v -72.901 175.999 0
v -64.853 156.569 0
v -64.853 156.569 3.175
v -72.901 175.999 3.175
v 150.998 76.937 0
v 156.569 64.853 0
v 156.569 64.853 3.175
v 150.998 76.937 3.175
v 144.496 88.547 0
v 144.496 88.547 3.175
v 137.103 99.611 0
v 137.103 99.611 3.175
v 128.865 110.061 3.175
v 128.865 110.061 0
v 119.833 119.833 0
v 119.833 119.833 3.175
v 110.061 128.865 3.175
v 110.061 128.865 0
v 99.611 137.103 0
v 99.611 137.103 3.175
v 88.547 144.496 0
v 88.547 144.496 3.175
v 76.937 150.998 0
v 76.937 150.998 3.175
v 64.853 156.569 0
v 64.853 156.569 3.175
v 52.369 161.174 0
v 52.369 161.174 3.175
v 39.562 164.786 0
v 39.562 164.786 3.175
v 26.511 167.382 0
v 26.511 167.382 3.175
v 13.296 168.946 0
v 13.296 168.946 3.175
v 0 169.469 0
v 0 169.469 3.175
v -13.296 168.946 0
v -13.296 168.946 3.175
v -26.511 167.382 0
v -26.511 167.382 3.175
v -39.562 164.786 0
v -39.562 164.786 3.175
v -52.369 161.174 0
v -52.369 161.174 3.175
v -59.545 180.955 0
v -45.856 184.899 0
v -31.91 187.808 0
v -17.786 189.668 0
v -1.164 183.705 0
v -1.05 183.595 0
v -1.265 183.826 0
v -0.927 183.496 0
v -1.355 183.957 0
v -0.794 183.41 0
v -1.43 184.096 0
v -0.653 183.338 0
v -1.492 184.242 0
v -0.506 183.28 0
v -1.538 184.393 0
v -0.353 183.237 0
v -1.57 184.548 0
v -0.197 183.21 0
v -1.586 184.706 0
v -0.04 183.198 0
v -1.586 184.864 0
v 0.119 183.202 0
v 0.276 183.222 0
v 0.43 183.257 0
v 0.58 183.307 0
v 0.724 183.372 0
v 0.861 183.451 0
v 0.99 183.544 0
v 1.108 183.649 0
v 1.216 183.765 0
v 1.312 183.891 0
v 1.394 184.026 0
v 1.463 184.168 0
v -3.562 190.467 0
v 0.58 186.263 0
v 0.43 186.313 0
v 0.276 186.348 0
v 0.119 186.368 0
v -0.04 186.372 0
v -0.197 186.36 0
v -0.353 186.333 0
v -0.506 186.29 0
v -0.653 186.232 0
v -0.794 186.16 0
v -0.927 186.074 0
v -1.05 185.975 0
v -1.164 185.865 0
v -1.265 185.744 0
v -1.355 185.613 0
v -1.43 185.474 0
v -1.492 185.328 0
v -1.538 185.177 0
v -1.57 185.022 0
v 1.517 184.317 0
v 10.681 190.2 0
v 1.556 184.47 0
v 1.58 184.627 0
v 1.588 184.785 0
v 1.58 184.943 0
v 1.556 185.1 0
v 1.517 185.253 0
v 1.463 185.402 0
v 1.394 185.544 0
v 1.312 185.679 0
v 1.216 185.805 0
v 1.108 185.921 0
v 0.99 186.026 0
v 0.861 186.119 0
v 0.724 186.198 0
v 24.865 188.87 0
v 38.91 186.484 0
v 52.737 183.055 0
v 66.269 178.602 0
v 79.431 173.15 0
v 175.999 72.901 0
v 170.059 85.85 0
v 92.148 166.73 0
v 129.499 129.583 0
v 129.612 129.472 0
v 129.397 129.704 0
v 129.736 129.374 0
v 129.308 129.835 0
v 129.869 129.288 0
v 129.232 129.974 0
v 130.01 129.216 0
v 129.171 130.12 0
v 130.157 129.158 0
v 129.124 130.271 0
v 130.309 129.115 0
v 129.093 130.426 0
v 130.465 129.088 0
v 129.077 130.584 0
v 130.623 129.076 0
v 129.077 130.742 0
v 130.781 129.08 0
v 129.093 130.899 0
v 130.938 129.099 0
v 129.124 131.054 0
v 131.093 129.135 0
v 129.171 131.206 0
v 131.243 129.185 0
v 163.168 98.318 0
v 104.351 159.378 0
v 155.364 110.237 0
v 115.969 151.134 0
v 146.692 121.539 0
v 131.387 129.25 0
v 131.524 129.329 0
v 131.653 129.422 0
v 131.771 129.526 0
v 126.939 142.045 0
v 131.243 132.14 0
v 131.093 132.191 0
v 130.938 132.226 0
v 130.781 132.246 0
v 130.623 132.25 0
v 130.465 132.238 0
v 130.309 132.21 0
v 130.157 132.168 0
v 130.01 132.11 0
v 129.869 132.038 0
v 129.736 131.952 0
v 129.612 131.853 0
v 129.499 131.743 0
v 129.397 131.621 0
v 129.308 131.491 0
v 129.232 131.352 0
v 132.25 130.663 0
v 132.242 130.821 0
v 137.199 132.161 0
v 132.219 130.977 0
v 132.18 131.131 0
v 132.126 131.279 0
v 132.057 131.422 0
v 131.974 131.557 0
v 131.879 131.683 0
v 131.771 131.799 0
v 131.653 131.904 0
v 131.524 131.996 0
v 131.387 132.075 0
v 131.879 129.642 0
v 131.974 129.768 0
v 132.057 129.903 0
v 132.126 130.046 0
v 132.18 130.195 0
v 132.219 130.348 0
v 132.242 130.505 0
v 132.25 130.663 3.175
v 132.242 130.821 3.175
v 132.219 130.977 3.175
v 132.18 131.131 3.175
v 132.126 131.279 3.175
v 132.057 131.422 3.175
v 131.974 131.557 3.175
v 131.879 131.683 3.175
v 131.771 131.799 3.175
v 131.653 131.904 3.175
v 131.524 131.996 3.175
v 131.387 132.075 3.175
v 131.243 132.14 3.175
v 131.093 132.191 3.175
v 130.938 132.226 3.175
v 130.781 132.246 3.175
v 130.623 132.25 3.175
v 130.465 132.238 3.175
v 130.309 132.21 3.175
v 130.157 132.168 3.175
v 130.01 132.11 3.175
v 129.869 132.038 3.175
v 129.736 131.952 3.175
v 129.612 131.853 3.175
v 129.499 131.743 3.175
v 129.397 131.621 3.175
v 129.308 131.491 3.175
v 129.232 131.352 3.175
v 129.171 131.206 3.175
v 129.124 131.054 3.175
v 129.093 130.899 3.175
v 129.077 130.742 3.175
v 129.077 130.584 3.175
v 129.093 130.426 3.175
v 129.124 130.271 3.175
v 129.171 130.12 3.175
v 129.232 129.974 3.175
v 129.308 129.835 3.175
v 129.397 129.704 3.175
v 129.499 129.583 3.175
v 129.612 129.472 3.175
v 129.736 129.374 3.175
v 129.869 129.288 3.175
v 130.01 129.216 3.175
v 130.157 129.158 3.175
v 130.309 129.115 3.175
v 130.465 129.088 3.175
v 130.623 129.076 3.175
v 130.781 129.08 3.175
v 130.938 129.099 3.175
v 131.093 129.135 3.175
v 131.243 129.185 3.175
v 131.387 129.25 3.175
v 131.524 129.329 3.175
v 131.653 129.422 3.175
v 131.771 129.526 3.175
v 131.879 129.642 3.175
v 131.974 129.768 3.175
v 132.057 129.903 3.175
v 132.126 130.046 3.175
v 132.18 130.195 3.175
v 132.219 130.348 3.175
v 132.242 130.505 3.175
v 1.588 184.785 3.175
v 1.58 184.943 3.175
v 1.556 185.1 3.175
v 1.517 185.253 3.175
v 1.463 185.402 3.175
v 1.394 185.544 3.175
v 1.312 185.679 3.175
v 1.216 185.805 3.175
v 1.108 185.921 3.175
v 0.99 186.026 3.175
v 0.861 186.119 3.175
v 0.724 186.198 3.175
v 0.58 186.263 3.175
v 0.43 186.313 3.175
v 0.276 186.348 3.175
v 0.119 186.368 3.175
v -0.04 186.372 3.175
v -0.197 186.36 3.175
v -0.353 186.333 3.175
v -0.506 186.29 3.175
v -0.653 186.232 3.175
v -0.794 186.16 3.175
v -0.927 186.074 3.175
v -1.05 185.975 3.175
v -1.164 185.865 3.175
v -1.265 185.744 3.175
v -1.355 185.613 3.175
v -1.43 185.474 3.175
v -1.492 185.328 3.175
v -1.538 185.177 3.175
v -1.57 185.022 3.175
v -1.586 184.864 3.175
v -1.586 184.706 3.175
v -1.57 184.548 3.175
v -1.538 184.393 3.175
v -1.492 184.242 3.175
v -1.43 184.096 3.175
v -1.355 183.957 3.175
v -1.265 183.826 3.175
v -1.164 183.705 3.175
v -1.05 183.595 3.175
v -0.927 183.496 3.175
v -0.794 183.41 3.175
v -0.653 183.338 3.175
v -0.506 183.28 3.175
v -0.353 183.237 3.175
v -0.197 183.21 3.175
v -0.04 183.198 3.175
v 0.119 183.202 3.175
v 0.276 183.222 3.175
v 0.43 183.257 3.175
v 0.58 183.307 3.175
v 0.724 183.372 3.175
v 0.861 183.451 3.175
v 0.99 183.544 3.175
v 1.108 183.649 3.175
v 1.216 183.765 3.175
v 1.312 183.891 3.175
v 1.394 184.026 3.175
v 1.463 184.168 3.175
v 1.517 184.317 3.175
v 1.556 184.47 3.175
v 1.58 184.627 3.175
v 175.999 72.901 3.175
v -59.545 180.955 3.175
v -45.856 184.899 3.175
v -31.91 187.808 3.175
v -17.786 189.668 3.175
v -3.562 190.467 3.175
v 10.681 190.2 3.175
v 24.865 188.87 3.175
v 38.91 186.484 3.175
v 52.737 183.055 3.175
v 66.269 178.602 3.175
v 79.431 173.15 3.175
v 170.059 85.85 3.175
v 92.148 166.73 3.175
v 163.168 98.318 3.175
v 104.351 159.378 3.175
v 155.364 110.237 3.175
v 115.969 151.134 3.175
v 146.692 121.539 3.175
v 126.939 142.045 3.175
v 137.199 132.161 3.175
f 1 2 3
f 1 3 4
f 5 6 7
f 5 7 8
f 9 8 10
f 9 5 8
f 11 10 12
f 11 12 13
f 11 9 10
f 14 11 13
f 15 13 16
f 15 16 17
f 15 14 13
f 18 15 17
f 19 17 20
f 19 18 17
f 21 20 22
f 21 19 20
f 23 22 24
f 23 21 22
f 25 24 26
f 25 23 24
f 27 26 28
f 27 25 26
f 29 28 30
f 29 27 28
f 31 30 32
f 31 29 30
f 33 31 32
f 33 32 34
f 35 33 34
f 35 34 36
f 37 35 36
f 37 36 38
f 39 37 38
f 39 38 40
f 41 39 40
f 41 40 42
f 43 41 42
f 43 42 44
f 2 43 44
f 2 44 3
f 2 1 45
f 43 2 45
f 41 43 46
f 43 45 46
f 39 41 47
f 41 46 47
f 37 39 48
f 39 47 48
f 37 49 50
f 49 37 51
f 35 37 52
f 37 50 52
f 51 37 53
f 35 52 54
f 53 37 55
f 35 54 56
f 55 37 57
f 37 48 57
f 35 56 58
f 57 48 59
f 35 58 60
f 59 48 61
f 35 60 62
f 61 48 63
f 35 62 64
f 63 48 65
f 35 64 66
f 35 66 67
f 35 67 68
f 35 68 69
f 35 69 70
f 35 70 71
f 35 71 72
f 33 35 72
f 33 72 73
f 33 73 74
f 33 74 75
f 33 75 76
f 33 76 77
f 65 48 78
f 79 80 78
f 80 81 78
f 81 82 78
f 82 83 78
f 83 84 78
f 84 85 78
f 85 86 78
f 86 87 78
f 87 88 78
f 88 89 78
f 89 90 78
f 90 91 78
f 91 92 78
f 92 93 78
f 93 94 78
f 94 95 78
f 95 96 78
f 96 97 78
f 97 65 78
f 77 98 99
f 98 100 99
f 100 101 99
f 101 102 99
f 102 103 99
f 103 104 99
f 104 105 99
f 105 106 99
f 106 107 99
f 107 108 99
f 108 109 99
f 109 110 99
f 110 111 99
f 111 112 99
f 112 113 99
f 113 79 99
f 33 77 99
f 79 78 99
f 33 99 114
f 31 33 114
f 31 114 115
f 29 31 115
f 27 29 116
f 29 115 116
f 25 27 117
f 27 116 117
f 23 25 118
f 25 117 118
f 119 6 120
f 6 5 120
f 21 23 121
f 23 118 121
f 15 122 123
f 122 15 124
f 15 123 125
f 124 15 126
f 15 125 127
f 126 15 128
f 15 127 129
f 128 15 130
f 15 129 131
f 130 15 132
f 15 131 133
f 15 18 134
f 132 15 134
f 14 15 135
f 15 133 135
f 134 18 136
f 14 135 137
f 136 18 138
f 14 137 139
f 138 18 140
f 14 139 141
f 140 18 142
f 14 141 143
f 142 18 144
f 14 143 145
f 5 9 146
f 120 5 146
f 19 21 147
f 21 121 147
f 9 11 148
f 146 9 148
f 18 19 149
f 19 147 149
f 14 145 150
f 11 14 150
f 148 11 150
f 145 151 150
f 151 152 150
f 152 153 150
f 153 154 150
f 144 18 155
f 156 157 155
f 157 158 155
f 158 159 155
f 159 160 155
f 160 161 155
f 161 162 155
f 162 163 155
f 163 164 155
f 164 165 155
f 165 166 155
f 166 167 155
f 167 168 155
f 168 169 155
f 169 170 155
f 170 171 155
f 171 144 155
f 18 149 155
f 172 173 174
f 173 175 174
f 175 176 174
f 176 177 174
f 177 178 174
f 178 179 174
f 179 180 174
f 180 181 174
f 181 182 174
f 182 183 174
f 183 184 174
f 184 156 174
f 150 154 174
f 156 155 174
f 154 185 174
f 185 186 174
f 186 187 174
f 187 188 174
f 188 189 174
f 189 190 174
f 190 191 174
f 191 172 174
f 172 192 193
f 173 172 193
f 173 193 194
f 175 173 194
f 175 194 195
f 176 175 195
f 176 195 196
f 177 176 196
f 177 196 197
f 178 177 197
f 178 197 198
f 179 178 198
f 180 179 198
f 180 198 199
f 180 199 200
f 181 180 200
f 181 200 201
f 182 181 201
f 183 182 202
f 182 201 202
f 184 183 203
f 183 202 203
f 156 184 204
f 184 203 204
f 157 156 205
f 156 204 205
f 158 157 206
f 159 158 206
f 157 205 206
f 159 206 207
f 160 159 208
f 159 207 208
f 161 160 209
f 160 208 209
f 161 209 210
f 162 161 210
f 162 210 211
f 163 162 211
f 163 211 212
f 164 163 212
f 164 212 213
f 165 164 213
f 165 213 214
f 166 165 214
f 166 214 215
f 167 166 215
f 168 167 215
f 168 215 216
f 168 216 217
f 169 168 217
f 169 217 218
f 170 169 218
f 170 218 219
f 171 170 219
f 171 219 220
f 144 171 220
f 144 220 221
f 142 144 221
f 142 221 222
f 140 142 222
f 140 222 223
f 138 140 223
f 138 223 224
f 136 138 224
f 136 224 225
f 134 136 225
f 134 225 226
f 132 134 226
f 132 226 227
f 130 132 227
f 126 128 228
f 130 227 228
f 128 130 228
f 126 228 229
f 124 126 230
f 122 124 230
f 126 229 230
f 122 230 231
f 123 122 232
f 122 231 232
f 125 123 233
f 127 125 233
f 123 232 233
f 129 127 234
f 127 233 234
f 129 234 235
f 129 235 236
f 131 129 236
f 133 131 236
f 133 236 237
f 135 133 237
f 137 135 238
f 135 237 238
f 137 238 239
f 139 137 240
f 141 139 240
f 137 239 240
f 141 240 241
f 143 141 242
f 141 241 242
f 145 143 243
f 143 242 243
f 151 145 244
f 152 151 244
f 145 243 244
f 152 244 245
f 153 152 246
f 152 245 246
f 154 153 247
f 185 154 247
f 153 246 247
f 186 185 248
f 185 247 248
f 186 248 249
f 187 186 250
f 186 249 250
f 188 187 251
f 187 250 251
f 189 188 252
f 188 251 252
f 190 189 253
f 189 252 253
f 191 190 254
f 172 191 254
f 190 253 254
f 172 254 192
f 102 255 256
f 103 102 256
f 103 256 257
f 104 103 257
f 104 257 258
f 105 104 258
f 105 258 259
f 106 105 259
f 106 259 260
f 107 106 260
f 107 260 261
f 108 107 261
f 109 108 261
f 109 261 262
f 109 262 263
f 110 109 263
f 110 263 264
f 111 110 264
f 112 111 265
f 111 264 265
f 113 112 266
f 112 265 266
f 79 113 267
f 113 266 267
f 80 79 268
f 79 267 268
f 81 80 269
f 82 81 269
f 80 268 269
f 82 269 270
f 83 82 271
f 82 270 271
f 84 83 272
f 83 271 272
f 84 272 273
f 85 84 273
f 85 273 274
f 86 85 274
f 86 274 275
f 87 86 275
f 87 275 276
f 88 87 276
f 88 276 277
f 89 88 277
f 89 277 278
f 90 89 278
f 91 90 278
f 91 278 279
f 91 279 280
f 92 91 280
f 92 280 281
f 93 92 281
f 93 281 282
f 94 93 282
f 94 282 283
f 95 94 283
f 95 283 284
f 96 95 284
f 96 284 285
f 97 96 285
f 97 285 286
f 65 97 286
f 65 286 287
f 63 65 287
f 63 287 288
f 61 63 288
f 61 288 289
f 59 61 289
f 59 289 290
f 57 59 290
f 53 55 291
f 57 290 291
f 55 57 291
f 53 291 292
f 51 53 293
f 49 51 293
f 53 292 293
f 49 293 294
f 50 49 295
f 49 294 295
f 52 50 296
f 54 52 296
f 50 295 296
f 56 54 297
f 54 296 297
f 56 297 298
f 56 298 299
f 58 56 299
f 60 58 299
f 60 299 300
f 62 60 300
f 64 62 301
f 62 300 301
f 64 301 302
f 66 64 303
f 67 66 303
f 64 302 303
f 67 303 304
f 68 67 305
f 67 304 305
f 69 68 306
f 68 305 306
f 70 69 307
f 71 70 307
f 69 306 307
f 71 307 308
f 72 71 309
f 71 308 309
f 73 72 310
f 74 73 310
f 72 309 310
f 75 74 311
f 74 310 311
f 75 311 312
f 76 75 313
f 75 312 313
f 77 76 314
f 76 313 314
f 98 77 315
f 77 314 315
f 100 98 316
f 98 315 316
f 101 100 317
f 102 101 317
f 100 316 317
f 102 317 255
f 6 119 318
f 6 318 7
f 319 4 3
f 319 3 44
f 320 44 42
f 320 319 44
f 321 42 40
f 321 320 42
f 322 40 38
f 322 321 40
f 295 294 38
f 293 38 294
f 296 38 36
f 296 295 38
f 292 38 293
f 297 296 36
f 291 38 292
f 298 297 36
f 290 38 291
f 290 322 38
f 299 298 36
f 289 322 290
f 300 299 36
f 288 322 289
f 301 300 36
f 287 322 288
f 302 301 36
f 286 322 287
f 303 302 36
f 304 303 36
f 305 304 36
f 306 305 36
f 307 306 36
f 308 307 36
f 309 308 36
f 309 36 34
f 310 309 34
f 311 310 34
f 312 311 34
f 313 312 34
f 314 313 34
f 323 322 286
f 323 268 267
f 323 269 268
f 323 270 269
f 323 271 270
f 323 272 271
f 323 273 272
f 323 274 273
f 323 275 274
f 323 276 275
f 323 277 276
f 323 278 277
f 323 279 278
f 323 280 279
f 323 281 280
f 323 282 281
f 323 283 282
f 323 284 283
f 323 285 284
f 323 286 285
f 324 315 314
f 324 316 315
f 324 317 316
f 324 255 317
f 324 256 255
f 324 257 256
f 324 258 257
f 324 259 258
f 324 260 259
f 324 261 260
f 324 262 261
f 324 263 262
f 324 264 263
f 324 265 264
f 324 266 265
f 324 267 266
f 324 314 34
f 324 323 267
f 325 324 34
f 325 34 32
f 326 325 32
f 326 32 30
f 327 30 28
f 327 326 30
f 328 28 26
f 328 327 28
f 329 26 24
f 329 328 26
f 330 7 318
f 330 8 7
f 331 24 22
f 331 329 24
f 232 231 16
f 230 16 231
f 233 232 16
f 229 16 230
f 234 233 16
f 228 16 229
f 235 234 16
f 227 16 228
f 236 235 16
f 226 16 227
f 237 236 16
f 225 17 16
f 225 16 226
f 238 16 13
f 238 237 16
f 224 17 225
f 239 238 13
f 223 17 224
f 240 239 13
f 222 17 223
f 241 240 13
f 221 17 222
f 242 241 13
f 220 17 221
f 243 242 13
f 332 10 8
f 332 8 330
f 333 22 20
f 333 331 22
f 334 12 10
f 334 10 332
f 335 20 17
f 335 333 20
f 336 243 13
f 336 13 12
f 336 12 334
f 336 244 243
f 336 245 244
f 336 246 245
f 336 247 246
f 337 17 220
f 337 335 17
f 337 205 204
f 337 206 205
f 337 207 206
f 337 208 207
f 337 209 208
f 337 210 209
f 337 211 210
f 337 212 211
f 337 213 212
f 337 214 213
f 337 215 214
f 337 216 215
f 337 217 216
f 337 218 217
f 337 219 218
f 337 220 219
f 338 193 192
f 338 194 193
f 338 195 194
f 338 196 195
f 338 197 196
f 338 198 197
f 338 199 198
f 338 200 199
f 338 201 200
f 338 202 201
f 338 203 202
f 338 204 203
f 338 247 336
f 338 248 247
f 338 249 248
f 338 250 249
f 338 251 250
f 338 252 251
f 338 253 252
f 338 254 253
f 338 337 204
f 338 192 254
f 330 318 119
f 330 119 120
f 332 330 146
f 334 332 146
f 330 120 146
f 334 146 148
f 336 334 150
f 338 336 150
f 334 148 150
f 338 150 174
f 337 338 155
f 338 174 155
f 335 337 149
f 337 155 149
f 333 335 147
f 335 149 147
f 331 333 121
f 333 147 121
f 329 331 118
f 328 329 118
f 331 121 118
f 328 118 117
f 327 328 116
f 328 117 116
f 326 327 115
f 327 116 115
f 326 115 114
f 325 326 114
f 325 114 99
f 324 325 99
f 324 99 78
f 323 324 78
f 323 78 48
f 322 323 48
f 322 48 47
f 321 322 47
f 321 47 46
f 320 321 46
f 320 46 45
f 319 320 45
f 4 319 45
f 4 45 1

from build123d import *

# Parameters (mm, degrees)
SKETCH2_R           = 190.5
SKETCH2_R_2         = 169.4688
BOSS_EXTRUDE2_DEPTH = 3.175
SKETCH6_R           = 1.5875
CUT_EXTRUDE1_DEPTH  = 270.426391849
SPLIT3_OUTLINE_R    = 1.5875
SPLIT3_DEPTH        = 3.175


# Read off the part's stored shape, not the designer's step: Split3
with BuildPart() as part:
    # Sketch2 → Boss-Extrude2 (new body)
    with BuildSketch(Plane.XY):
        Circle(SKETCH2_R)
        Circle(SKETCH2_R_2, mode=Mode.SUBTRACT)
    extrude(amount=BOSS_EXTRUDE2_DEPTH)

    # Sketch6 → Cut-Extrude1 (cut, through all)
    with BuildSketch(Plane.XY.offset(3.175)):
        with Locations((0, 184.785)):
            Circle(SKETCH6_R)
        with Locations((130.662726562, 130.662726562)):
            Circle(SKETCH6_R)
        with Locations((184.785, 0)):
            Circle(SKETCH6_R)
        with Locations((130.662726562, -130.662726562)):
            Circle(SKETCH6_R)
        with Locations((0, -184.785)):
            Circle(SKETCH6_R)
        with Locations((-130.662726562, -130.662726562)):
            Circle(SKETCH6_R)
        with Locations((-184.785, 0)):
            Circle(SKETCH6_R)
        with Locations((-130.662726562, 130.662726562)):
            Circle(SKETCH6_R)
    extrude(amount=-CUT_EXTRUDE1_DEPTH, mode=Mode.SUBTRACT)

    # Split3 outline → Split3 (cut)
    with BuildSketch(Plane.XY):
        with BuildLine():
            ThreePointArc((-72.901193866, 175.999050943), (-72.901193865, -175.999050944), (175.999050943, 72.901193866))
            Line((175.999050943, 72.901193866), (156.568755719, 64.852902063))
            ThreePointArc((156.568755719, 64.852902063), (-64.852902063, -156.568755719), (-64.852902063, 156.568755719))
            Line((-64.852902063, 156.568755719), (-72.901193866, 175.999050943))
        make_face()
        with Locations((-130.662726562, -130.662726562)):
            Circle(SPLIT3_OUTLINE_R, mode=Mode.SUBTRACT)
        with Locations((0, -184.785)):
            Circle(SPLIT3_OUTLINE_R, mode=Mode.SUBTRACT)
        with Locations((130.662726562, -130.662726562)):
            Circle(SPLIT3_OUTLINE_R, mode=Mode.SUBTRACT)
        with Locations((-184.785, 0)):
            Circle(SPLIT3_OUTLINE_R, mode=Mode.SUBTRACT)
        with Locations((-130.662726562, 130.662726562)):
            Circle(SPLIT3_OUTLINE_R, mode=Mode.SUBTRACT)
        with Locations((184.785, 0)):
            Circle(SPLIT3_OUTLINE_R, mode=Mode.SUBTRACT)
    extrude(amount=SPLIT3_DEPTH, mode=Mode.SUBTRACT)


solid = part.part
